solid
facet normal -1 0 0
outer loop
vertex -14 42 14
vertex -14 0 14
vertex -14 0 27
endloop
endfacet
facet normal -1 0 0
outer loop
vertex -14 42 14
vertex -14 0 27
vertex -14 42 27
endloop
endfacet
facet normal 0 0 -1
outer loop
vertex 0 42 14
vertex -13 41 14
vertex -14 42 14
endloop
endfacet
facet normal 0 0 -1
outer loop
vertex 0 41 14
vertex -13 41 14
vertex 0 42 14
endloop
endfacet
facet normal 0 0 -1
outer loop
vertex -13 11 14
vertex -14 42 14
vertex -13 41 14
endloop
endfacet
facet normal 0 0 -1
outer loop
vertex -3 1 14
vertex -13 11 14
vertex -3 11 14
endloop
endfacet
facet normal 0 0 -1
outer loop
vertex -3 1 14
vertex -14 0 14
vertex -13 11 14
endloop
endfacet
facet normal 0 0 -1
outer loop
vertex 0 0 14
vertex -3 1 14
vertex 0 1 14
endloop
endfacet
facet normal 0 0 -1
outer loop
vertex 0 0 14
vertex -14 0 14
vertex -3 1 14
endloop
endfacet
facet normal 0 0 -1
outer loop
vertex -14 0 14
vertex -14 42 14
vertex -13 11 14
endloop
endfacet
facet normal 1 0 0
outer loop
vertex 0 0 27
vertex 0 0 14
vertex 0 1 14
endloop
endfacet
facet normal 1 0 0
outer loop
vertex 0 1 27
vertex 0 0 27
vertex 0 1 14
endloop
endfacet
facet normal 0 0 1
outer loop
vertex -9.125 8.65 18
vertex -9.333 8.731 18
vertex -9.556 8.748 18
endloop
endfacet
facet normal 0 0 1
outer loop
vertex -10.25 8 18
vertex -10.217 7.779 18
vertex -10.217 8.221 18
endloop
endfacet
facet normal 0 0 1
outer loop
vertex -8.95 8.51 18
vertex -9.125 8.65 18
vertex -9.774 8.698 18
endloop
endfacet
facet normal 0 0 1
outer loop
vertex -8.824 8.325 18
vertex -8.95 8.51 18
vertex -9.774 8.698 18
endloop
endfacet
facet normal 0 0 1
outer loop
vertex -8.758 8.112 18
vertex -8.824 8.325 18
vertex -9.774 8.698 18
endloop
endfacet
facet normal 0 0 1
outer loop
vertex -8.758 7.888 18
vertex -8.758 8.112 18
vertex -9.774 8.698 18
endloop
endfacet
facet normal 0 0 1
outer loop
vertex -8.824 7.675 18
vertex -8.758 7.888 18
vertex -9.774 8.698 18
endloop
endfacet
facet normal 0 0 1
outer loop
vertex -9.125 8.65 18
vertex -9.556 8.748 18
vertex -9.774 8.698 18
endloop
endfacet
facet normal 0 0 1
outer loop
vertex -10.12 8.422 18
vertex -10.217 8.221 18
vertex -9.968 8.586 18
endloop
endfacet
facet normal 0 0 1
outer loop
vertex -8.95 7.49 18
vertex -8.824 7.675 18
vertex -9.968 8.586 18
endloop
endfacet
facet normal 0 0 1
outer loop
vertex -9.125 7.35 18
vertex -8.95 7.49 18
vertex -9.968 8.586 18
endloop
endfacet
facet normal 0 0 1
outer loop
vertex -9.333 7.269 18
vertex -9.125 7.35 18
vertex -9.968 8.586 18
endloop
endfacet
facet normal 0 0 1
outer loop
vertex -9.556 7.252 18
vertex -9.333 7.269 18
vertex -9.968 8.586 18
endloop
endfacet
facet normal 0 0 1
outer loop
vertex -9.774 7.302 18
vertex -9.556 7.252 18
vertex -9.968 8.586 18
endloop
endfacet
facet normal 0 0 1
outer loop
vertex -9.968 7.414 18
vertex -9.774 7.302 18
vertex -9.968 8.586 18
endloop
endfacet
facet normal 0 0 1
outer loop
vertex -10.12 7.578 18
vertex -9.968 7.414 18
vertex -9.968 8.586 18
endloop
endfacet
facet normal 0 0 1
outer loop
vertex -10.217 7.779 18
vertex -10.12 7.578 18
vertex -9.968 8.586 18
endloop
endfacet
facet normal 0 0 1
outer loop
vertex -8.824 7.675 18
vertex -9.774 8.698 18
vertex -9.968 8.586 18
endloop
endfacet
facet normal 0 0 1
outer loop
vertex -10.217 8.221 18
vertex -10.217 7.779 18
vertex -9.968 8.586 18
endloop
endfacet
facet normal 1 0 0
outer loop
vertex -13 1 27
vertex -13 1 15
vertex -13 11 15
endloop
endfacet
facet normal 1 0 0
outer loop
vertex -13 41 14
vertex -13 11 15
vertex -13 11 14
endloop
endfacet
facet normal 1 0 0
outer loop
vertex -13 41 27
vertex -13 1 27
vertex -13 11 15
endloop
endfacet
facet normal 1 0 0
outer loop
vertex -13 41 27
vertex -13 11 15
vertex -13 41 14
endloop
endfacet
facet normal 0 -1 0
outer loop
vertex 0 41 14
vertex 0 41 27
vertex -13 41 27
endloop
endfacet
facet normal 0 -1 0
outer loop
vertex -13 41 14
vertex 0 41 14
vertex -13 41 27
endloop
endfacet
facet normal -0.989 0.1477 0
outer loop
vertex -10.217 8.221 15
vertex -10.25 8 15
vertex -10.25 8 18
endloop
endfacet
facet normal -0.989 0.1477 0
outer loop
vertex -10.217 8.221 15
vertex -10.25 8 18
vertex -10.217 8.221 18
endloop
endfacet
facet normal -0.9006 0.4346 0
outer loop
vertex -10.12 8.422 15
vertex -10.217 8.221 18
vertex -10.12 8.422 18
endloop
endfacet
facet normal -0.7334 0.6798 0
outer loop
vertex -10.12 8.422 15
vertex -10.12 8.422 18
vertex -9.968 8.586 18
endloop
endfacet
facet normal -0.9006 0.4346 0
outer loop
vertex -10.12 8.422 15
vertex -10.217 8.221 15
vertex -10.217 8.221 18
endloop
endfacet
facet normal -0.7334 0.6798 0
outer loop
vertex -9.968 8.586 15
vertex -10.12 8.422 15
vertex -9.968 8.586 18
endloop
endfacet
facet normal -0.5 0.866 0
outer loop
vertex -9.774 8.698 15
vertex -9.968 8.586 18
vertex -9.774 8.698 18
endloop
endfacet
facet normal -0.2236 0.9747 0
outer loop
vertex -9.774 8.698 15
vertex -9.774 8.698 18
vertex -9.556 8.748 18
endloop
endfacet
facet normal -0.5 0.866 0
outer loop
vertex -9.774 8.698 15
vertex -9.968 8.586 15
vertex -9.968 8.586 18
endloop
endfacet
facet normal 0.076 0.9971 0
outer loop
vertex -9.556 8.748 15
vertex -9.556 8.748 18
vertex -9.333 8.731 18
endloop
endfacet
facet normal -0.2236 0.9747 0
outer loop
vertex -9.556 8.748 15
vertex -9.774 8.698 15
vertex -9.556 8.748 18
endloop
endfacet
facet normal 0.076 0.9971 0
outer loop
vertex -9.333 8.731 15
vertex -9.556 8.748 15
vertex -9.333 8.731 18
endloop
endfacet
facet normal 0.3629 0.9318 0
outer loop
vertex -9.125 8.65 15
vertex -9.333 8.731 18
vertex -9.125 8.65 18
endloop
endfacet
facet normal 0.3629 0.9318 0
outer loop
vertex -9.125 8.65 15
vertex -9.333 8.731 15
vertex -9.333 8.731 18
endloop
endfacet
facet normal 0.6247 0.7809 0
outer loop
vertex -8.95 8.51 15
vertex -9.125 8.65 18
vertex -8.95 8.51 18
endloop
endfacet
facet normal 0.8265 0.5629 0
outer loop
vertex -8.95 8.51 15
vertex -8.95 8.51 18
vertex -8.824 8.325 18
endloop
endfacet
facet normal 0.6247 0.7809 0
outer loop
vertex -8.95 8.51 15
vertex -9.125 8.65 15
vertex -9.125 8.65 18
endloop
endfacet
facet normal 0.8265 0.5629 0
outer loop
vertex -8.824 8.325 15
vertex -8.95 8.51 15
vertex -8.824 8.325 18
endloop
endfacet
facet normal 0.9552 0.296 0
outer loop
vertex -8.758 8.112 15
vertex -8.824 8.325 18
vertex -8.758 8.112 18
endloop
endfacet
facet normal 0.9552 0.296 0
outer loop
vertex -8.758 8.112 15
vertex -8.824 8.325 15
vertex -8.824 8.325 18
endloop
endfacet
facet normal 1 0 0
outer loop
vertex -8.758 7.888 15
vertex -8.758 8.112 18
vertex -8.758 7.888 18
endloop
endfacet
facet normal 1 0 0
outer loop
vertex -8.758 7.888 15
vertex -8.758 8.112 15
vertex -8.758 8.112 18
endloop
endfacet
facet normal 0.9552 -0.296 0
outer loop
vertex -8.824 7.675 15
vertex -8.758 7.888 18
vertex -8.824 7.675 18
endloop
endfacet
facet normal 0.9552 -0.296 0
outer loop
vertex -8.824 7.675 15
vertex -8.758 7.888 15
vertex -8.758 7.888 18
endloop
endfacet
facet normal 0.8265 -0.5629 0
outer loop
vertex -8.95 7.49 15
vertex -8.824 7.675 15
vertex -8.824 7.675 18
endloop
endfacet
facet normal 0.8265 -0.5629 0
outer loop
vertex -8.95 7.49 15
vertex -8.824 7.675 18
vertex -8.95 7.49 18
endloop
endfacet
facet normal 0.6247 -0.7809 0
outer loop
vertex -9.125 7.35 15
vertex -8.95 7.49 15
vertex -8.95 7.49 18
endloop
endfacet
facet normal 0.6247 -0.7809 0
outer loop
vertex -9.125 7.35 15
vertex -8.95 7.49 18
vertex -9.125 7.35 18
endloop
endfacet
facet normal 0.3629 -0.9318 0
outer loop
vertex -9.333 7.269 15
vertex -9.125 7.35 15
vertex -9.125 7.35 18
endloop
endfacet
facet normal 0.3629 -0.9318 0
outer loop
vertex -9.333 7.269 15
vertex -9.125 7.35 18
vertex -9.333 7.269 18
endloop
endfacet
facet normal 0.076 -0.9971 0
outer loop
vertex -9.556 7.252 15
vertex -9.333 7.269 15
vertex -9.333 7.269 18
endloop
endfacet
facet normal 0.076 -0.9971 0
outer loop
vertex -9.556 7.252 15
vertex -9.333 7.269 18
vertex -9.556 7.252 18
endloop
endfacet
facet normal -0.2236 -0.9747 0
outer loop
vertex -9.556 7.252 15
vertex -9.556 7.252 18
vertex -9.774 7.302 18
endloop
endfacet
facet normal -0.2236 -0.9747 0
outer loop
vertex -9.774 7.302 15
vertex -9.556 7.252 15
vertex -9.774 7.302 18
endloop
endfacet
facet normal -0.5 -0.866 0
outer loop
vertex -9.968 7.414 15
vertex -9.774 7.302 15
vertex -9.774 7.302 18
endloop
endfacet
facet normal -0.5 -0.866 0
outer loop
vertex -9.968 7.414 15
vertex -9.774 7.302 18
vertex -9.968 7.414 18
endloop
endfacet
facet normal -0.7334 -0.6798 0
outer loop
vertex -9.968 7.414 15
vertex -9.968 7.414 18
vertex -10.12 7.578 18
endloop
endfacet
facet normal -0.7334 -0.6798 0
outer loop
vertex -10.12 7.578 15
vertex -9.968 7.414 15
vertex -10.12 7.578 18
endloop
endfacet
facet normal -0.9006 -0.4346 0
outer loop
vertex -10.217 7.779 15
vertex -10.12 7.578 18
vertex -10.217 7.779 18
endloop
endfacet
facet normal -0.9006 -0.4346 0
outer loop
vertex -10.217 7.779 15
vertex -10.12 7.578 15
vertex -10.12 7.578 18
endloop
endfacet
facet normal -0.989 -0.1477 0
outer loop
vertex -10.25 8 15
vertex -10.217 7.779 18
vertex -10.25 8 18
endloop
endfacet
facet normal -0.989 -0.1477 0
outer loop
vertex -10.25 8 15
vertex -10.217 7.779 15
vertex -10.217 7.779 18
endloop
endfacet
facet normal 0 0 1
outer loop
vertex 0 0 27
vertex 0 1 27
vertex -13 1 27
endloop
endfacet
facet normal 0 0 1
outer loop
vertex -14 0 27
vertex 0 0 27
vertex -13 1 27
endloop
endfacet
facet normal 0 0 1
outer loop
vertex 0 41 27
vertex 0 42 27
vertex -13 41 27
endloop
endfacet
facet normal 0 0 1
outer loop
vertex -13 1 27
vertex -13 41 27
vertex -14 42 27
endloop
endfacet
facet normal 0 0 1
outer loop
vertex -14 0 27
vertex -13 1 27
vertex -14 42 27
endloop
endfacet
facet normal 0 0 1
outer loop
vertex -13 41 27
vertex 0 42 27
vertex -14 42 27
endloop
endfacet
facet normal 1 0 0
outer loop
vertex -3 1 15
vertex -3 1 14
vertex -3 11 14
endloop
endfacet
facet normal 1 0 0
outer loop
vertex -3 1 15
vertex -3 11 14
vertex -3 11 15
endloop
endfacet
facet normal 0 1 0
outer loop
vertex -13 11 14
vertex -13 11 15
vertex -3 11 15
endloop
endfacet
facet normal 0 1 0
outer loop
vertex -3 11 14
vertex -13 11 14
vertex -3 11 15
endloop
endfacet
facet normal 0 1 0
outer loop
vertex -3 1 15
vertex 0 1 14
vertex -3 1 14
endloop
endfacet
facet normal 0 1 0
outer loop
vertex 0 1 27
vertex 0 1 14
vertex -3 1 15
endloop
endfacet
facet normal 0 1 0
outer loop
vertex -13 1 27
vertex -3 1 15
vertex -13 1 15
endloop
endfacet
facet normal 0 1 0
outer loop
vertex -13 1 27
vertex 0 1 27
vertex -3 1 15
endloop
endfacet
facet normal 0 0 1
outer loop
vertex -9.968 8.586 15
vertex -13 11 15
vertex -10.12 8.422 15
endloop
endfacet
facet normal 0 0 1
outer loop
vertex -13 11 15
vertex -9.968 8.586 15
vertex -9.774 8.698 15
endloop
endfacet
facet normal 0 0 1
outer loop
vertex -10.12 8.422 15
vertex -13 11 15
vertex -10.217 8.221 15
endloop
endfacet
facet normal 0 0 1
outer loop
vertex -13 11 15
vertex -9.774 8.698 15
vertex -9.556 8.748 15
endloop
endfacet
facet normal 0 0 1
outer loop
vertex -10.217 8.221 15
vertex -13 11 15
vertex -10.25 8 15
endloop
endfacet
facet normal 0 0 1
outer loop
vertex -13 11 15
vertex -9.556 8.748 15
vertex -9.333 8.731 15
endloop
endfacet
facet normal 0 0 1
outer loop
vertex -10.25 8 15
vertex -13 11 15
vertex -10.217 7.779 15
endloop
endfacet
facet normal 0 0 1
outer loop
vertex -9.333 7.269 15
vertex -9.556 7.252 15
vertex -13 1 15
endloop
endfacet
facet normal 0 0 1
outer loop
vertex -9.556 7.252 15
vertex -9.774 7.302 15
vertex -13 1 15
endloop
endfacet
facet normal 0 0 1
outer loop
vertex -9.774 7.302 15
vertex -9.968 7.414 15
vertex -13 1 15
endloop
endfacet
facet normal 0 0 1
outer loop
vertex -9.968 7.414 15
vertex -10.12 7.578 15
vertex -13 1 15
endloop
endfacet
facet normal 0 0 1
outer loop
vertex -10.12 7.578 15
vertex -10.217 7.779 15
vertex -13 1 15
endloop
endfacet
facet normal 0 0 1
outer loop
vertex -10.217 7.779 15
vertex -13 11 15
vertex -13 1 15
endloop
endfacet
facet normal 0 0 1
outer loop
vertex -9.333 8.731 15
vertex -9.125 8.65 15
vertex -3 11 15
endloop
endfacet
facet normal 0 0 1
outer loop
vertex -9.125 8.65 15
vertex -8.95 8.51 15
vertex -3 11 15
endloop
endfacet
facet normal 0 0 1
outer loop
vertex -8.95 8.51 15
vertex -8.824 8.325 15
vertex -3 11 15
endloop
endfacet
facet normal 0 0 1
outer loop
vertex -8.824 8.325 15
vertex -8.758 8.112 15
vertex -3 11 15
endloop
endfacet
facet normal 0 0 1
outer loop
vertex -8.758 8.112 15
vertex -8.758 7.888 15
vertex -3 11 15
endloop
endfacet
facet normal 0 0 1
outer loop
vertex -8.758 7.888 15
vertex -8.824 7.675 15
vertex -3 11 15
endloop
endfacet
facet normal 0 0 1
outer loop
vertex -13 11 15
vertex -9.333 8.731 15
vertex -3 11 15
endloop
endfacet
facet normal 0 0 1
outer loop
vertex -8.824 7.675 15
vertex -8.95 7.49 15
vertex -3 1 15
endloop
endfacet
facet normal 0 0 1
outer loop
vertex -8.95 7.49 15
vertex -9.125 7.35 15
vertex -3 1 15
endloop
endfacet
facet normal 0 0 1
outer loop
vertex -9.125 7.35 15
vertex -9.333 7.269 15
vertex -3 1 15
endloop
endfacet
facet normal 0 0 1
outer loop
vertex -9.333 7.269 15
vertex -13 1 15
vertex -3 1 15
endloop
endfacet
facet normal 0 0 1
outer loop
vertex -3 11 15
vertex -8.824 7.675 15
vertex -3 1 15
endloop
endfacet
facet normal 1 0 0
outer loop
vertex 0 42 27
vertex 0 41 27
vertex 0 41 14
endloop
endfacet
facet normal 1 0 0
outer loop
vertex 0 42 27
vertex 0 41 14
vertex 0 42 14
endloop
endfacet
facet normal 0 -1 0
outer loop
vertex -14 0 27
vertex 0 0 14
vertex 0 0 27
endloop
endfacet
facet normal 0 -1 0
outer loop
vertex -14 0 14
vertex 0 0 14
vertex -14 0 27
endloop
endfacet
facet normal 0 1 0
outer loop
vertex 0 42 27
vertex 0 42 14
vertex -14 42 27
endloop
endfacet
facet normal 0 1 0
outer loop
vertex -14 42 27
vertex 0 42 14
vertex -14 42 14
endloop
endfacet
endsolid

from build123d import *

# Parameters (mm, degrees)
SKETCH008_W     = 14
SKETCH008_H     = 42
PAD002_DEPTH    = 13
SKETCH010_W     = 13
SKETCH010_H     = 40
POCKET006_DEPTH = 13.001
SKETCH011_W     = 10
SKETCH011_H     = 1
PAD004_DEPTH    = 10
SKETCH012_R     = 0.75
PAD005_DEPTH    = 3


with BuildPart() as sensor_case:
    # Sketch008 → Pad002 (new body)
    with BuildSketch(Plane.XY):
        with Locations((7, 21)):
            Rectangle(SKETCH008_W, SKETCH008_H)
    extrude(amount=PAD002_DEPTH)

    # Sketch010 (on Face6 of Pad002) → Pocket006 (cut, through all)
    with BuildSketch(Plane.XY.offset(13)):
        with Locations((6.5, 21)):
            Rectangle(SKETCH010_W, SKETCH010_H)
    extrude(amount=-POCKET006_DEPTH, mode=Mode.SUBTRACT)

    # Sketch011 → Pad004 (join)
    with BuildSketch(Plane(origin=(0, 1, 0), x_dir=(-1, 0, 0), z_dir=(0, 1, 0))):
        with Locations((-8, 0.5)):
            Rectangle(SKETCH011_W, SKETCH011_H)
    extrude(amount=PAD004_DEPTH)

    # Sketch012 (on Face13 of Pad004) → Pad005 (join)
    with BuildSketch(Plane.XY.offset(1)):
        with Locations((9.5, 8)):
            Circle(SKETCH012_R)
    extrude(amount=PAD005_DEPTH)


with BuildPart() as sensor_case_1:
    # Body001 placement: moved
    add(sensor_case.part.moved(Location((0, 0, 14))))


with BuildPart() as mirrored_sensor_case:
    # Part__Mirroring001: instance of Sensor Case
    add(sensor_case_1.part.mirror(Plane(origin=(0, 0, 0), x_dir=(0, -1, 0), z_dir=(1, 0, 0))))


solid = mirrored_sensor_case.part
